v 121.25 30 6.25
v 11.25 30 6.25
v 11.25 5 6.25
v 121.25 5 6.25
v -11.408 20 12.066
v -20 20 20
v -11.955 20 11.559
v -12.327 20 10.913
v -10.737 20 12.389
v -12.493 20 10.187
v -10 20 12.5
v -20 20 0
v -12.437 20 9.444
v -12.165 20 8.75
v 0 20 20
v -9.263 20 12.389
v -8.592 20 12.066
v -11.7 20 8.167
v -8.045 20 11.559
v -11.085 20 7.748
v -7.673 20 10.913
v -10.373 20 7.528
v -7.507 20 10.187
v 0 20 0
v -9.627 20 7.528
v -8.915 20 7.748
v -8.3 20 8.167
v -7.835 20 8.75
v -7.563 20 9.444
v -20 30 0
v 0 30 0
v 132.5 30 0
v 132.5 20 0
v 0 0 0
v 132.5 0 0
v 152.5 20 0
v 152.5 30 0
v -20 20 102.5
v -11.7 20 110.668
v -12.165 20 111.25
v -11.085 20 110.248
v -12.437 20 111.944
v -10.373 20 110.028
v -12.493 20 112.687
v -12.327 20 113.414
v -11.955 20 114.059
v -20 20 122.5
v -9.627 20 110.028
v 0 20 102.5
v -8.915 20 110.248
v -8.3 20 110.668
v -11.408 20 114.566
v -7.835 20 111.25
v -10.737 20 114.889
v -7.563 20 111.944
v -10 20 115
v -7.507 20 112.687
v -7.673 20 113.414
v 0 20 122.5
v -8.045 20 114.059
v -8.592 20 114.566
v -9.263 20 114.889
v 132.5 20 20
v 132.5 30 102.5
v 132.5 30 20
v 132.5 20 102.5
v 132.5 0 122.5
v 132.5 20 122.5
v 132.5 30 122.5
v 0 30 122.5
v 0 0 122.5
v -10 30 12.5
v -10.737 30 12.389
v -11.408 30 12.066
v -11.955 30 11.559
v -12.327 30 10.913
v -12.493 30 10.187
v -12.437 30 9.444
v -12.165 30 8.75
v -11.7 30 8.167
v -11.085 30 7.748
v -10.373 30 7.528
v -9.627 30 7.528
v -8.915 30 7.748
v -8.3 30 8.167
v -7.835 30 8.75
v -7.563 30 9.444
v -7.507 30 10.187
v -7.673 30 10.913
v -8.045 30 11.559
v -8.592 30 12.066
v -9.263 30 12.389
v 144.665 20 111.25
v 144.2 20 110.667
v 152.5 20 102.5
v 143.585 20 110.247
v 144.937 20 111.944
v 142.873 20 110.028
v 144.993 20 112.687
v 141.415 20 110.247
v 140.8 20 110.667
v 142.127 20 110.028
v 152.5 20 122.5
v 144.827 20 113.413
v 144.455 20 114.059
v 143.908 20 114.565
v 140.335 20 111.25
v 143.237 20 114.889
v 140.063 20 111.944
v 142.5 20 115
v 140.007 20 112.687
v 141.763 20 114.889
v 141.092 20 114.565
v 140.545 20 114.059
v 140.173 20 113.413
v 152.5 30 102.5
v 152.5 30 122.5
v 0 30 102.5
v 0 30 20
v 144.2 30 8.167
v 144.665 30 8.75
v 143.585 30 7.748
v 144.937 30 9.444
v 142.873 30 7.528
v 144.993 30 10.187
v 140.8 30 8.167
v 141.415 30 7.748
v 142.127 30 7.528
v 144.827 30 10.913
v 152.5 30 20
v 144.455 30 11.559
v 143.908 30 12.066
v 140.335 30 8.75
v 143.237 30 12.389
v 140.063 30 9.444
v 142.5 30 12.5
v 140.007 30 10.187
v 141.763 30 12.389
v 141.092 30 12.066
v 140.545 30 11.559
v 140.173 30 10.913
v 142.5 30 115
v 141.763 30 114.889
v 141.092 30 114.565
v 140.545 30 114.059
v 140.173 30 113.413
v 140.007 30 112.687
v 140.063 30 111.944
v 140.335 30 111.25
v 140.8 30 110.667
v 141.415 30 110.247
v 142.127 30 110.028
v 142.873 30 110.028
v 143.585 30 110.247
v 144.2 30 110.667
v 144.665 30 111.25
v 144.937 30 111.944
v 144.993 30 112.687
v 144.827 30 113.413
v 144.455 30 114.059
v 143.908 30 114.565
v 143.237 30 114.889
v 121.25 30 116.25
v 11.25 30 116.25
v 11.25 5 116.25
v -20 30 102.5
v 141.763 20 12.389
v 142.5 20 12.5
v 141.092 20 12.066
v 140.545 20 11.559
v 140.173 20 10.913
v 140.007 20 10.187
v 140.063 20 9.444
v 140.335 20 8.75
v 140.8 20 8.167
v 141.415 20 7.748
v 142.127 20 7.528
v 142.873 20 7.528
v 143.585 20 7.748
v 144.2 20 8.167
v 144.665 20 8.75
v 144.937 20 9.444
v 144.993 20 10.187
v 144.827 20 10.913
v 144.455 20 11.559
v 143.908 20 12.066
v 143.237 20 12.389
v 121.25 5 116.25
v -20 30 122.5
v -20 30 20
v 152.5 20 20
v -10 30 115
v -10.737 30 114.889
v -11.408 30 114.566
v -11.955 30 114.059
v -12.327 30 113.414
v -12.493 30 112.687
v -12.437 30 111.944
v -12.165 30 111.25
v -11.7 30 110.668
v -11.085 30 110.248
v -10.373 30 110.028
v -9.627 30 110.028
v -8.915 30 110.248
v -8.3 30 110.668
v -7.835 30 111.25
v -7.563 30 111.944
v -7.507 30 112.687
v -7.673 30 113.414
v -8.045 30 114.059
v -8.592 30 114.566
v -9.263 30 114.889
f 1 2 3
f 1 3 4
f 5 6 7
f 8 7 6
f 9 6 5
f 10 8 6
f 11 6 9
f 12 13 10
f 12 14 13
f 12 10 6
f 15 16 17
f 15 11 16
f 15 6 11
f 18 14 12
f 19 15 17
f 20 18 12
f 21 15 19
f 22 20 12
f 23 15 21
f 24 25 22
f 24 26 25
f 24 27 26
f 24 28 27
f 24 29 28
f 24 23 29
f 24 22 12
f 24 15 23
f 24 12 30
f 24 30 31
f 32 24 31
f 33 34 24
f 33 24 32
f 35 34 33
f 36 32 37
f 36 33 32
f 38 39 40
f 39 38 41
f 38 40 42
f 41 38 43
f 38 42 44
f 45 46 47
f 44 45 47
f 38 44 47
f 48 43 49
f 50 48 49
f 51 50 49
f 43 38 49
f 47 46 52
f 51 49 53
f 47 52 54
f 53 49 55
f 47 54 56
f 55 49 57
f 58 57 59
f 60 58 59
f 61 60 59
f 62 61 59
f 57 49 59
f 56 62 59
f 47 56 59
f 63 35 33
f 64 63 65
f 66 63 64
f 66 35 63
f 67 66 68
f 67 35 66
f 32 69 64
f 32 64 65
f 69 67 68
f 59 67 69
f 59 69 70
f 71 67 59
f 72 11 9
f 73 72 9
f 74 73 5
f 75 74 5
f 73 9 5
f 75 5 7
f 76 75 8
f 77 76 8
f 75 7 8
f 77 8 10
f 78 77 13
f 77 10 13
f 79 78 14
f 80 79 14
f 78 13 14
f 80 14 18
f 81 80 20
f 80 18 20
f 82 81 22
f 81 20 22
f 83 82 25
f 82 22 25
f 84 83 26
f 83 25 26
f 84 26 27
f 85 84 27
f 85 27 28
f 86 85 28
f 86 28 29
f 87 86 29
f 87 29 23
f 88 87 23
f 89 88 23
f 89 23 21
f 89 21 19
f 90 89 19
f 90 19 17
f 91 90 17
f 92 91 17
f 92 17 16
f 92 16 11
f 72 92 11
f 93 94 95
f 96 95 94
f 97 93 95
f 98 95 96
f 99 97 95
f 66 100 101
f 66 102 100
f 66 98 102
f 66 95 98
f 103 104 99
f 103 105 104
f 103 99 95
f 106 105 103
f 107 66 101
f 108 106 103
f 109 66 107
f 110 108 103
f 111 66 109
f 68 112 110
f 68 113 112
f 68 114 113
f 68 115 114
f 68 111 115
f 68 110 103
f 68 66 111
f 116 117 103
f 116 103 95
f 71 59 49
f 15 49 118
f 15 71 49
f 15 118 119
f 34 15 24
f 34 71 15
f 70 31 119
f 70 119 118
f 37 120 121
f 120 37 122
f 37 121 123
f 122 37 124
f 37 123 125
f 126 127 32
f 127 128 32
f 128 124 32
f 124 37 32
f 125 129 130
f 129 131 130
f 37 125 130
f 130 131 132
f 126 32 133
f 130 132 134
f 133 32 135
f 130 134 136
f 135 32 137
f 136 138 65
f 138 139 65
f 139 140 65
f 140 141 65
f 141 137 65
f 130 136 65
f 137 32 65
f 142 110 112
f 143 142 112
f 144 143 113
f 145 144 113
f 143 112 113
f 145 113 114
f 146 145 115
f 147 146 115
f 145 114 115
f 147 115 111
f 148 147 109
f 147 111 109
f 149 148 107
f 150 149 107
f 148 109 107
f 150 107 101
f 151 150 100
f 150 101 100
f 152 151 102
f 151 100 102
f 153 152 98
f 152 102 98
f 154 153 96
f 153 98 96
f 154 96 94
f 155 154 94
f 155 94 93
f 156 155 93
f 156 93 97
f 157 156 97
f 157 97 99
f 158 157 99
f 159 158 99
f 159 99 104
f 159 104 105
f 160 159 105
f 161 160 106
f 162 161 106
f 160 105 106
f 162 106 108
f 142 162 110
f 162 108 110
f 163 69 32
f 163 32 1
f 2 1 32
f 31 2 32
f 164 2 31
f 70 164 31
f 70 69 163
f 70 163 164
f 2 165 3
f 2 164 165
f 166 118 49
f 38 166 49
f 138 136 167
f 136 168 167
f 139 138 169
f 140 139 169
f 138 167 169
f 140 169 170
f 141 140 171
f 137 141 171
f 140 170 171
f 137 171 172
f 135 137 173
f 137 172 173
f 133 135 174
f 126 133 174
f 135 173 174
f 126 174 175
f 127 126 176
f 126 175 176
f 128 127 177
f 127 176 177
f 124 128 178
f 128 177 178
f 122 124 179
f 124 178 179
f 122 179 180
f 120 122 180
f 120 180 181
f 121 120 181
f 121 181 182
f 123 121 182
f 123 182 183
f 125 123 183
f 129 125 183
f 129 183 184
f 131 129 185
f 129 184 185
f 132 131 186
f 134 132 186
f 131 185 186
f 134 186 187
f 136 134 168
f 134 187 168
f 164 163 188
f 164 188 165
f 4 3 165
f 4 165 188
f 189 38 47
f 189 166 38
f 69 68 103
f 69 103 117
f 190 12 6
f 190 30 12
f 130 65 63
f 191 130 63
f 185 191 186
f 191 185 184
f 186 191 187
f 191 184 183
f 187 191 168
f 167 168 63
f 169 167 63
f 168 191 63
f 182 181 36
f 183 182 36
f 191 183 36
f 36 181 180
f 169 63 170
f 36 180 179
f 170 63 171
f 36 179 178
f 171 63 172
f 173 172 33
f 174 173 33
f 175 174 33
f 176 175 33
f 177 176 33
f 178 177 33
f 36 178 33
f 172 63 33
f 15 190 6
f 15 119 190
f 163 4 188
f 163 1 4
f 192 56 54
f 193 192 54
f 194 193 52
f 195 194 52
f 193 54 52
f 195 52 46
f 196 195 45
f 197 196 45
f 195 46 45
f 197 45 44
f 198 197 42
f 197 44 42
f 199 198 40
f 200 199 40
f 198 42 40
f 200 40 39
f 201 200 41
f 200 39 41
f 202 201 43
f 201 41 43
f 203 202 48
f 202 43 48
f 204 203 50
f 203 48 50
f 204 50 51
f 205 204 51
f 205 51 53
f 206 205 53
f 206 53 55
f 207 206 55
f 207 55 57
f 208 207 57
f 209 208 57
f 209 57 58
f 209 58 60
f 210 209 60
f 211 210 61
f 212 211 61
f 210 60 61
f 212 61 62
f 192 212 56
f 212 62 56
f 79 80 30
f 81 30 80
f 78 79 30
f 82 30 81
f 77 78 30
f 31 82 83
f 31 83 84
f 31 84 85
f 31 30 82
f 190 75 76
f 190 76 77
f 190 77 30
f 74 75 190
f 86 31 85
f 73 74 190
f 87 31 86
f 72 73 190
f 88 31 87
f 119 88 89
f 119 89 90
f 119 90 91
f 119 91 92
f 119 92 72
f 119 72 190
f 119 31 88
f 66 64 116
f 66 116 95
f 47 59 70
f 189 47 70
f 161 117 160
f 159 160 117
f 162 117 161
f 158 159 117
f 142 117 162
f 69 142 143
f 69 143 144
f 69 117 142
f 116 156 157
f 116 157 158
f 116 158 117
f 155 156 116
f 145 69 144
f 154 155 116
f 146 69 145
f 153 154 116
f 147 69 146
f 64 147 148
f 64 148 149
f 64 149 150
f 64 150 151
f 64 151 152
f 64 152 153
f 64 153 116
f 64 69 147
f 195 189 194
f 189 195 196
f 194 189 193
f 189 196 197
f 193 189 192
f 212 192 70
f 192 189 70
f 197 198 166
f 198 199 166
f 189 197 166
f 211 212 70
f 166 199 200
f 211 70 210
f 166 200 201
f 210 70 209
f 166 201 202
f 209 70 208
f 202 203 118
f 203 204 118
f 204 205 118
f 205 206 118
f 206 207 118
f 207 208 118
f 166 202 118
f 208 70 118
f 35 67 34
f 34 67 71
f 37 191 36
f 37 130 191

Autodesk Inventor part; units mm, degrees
ref_plane "YZ Plane" through (0, 0, 0) normal (1, 0, 0) x (0, 1, 0)
ref_plane "XZ Plane" through (0, 0, 0) normal (0, 1, 0) x (-1, 0, 0)
ref_plane "XY Plane" through (0, 0, 0) normal (0, 0, 1) x (1, 0, 0)
sketch "Skizze1" plane through (0, 0, 0) normal (0, 1, 0) x (-1, 0, 0)
  line L0 (0, 0) -> (-132.5, 0)
  line L1 (-132.5, 0) -> (-132.5, 122.5)
  line L2 (-132.5, 122.5) -> (0, 122.5)
  line L3 (0, 122.5) -> (0, 0)
  dimension "d0" = 132.5
  dimension "d1" = 122.5
extrude "Extrusion1" add sketch "Skizze1" along normal blind 30
sketch "Skizze2" plane through (0, 30, 0) normal (0, 1, 0) x (1, 0, 0)
  line L0 (0, 0) -> (11.25, 0)
  line L1 (11.25, 0) -> (11.25, -6.25)
  line L2 (11.25, -6.25) -> (121.25, -6.25)
  line L3 (121.25, -6.25) -> (121.25, -116.25)
  line L4 (121.25, -116.25) -> (11.25, -116.25)
  line L5 (11.25, -116.25) -> (11.25, -6.25)
  dimension "d4" = 11.25
  dimension "d5" = 6.25
  dimension "d6" = 110
  dimension "d7" = 110
extrude "Extrusion2" cut sketch "Skizze2" against normal blind 25
sketch "Skizze3" plane through (0, 0, 0) normal (-1, 0, 0) x (0, 0, 1)
  line L0 (0, 29.9998) -> (20, 29.9998)
  line L1 (20, 29.9998) -> (20, 19.9998)
  line L2 (20, 19.9998) -> (0, 19.9998)
  line L3 (0, 19.9998) -> (0, 29.9998)
  line L4 (122.5002, 29.9998) -> (102.5002, 29.9998)
  line L5 (102.5002, 29.9998) -> (102.5002, 19.9998)
  line L6 (102.5002, 19.9998) -> (122.5002, 19.9998)
  line L7 (122.5002, 19.9998) -> (122.5002, 29.9998)
  point P0 (0, 0)
  dimension "d10" = 20
  dimension "d11" = 10
  dimension "d12" = 20
  dimension "d13" = 10
extrude "Extrusion3" add sketch "Skizze3" along normal blind 20
sketch "Skizze4" plane through (132.5, 0, 122.5) normal (1, 0, 0) x (0, 0, -1)
  line L0 (0.0001, 29.9997) -> (20.0001, 29.9997)
  line L1 (20.0001, 29.9997) -> (20.0001, 19.9997)
  line L2 (20.0001, 19.9997) -> (0.0001, 19.9997)
  line L3 (0.0001, 19.9997) -> (0.0001, 29.9997)
  line L4 (122.5, 29.9997) -> (102.5, 29.9997)
  line L5 (102.5, 29.9997) -> (102.5, 19.9997)
  line L6 (102.5, 19.9997) -> (122.5, 19.9997)
  line L7 (122.5, 19.9997) -> (122.5, 29.9997)
  point P0 (122.5, 0)
  dimension "d16" = 20
  dimension "d17" = 10
  dimension "d18" = 20
  dimension "d19" = 10
extrude "Extrusion4" add sketch "Skizze4" along normal blind 20
sketch "Skizze5" plane through (0, 29.9998, 122.5) normal (0, 1, 0) x (1, 0, 0)
  line L0 (0, 19.9998) -> (-20, 19.9998) projected
  line L1 (-20, -0.0002) -> (-20, 19.9998) projected
  point P0 (0, 122.5)
  point P1 (-10, 9.9998)
  dimension "d22" = 10
  dimension "d23" = 10
hole "Bohrung1" at (-10, 29.9998, 112.5002) direction (0, -1, 0) diameter 5 end through all
sketch "Skizze6" plane through (0, 29.9998, 20) normal (0, 1, 0) x (1, 0, 0)
  line L0 (0, 20) -> (-20, 20) projected
  line L1 (-20, 0) -> (-20, 20) projected
  point P0 (-10, 10)
  dimension "d31" = 10
  dimension "d32" = 10
hole "Bohrung2" at (-10, 29.9998, 10) direction (0, -1, 0) diameter 5 end through all
sketch "Skizze7" plane through (132.5, 29.9997, 122.4999) normal (0, 1, 0) x (1, 0, 0)
  line L0 (0, 20) -> (20, 20) projected
  line L1 (20, 20) -> (20, 0) projected
  point P0 (-132.5, 122.4999)
  point P1 (10, 10)
  dimension "d40" = 10
  dimension "d41" = 10
hole "Bohrung3" at (142.5, 29.9997, 112.4999) direction (0, -1, 0) diameter 5 end through all
sketch "Skizze8" plane through (132.5, 29.9997, 20) normal (0, 1, 0) x (1, 0, 0)
  line L0 (0, 20) -> (20, 20) projected
  line L1 (20, 20) -> (20, 0) projected
  point P0 (-132.5, 20)
  point P1 (10, 10)
  dimension "d49" = 10
  dimension "d50" = 10
hole "Bohrung4" at (142.5, 29.9997, 10) direction (0, -1, 0) diameter 5 end through all
thread "Gewinde1" size "M5x0.8" class "6H" standard "ANSI Metric M Profile" full length
thread "Gewinde2" size "M5x0.8" class "6H" standard "ANSI Metric M Profile" full length
thread "Gewinde3" size "M5x0.8" class "6H" standard "ANSI Metric M Profile" full length
thread "Gewinde4" size "M5x0.8" class "6H" standard "ANSI Metric M Profile" full length
properties part number "Oberteil"
